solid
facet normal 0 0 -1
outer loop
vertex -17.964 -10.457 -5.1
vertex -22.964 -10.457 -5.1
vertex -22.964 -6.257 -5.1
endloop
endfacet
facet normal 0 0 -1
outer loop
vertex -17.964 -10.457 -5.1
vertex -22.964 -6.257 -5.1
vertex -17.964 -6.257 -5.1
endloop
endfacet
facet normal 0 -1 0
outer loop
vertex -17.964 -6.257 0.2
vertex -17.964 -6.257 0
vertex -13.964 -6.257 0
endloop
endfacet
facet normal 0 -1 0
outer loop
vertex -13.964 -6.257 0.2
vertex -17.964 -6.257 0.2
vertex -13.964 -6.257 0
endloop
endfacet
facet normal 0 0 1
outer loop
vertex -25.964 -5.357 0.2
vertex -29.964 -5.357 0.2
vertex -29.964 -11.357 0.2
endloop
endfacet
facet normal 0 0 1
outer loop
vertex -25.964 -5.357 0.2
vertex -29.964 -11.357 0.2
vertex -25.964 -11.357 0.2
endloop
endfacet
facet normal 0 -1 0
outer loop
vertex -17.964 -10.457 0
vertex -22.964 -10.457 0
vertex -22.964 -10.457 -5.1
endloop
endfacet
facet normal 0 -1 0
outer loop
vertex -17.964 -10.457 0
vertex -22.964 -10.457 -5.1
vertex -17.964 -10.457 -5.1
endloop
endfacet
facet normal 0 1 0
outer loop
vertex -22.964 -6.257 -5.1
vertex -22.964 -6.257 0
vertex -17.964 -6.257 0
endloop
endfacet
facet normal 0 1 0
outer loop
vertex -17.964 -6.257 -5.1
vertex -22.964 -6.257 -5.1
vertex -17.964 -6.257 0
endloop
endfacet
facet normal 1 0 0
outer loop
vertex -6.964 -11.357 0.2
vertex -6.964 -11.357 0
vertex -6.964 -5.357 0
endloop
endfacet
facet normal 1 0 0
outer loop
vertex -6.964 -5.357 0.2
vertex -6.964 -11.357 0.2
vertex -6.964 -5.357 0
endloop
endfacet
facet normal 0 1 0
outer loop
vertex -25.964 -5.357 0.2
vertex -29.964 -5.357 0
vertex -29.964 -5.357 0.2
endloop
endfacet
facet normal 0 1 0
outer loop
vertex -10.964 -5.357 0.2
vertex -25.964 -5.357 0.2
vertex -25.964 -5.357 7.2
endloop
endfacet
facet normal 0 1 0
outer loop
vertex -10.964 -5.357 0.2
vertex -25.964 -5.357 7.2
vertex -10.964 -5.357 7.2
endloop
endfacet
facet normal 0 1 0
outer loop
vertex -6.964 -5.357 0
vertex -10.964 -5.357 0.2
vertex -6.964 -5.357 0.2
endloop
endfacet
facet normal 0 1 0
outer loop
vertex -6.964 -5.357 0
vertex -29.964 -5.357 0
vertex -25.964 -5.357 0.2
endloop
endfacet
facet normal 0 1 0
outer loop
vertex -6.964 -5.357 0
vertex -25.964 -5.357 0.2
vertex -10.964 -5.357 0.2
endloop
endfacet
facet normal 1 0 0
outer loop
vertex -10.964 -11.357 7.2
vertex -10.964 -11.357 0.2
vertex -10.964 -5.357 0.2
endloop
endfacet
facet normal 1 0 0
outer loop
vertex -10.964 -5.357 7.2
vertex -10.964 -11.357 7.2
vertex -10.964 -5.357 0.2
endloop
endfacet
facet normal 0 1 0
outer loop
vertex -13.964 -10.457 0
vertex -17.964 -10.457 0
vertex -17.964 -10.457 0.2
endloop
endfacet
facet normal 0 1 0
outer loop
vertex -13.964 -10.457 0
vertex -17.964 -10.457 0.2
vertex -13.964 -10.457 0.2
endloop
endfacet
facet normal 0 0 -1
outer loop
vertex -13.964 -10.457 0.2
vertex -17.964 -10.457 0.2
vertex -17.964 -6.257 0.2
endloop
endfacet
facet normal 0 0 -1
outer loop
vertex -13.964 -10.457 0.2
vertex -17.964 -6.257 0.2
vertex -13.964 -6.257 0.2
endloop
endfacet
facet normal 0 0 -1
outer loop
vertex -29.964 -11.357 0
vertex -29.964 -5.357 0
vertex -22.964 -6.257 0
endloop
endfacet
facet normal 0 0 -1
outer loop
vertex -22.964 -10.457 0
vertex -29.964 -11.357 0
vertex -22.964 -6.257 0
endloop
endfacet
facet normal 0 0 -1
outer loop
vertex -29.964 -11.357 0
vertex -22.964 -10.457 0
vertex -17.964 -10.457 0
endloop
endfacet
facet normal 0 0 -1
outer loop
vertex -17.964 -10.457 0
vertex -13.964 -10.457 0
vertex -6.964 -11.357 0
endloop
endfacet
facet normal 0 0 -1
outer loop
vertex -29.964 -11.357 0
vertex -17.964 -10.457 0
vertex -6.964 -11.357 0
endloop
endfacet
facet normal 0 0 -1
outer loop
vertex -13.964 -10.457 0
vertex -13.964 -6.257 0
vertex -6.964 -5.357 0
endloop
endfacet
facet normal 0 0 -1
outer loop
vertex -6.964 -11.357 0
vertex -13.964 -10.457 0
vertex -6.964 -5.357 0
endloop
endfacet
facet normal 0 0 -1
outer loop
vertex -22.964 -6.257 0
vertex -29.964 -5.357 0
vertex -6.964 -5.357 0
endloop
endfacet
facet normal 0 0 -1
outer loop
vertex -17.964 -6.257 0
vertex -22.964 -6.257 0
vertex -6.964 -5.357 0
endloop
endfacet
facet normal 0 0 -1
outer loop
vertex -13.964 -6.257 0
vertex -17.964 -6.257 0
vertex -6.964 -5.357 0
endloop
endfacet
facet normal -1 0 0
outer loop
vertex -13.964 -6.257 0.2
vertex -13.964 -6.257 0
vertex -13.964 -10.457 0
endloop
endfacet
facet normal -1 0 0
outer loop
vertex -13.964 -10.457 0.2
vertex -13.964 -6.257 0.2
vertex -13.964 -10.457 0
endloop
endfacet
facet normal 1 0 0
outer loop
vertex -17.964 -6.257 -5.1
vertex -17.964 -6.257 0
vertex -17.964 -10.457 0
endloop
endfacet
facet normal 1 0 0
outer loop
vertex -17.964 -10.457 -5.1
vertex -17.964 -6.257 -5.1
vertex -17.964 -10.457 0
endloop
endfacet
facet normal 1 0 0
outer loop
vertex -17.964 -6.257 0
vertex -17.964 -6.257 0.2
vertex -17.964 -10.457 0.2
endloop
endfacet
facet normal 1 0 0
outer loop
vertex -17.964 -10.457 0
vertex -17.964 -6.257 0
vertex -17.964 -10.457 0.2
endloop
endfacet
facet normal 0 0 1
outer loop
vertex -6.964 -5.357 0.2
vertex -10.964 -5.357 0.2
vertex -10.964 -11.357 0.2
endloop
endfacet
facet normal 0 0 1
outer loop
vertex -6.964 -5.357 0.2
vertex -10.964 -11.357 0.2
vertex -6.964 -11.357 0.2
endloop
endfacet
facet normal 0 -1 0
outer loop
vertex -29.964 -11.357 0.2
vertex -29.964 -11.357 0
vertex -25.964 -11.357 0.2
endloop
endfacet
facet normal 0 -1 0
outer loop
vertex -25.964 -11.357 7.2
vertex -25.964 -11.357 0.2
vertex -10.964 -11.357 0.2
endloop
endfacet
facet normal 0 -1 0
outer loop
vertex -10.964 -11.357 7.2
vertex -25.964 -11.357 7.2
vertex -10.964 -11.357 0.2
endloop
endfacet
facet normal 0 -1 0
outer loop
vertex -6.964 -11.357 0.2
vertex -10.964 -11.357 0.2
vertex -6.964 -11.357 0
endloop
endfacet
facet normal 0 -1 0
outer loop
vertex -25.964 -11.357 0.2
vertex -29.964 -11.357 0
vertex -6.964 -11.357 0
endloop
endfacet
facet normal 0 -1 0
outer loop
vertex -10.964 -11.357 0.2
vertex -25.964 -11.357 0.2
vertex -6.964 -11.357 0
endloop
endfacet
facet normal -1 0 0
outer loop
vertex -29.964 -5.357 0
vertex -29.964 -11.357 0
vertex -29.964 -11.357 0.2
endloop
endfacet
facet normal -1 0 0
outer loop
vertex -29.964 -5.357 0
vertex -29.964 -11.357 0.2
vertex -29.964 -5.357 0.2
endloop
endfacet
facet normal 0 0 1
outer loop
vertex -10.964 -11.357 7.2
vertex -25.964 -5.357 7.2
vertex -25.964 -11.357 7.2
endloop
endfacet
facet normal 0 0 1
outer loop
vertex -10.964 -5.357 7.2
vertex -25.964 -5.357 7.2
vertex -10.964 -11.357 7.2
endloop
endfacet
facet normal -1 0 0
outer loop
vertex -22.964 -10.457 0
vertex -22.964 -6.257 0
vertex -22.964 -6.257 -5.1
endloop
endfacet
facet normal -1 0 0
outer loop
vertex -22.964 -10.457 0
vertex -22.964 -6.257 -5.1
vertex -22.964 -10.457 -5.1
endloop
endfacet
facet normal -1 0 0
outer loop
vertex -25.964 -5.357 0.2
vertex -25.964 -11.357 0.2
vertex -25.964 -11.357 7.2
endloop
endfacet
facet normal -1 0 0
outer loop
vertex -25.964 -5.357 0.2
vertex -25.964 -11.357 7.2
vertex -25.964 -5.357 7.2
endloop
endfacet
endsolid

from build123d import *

# Parameters (mm, degrees)
F0_W     = 23
F0_H     = 6
F1_DEPTH = 0.2
F2_W     = 15
F2_H     = 6
F3_DEPTH = 7
F4_W     = 9
F4_H     = 4.2
F5_DEPTH = 0.2
F6_W     = 5
F6_H     = 4.2
F7_DEPTH = 5.3


with BuildPart() as f1:
    # F0 (on Top) → F1 (new body)
    with BuildSketch(Plane.XY):
        with Locations((-18.463512, -8.357231)):
            Rectangle(F0_W, F0_H)
    extrude(amount=F1_DEPTH)

    # F2 (on face) → F3 (join)
    with BuildSketch(Plane.XY.offset(0.2)):
        with Locations((-18.463512, -8.357231)):
            Rectangle(F2_W, F2_H)
    extrude(amount=F3_DEPTH)

    # F4 (on face) → F5 (cut)
    with BuildSketch(Plane(origin=(0, 0, 0), x_dir=(1, 0, 0), z_dir=(0, 0, -1))):
        with Locations((-18.463512, 8.357231)):
            Rectangle(F4_W, F4_H)
    extrude(amount=-F5_DEPTH, mode=Mode.SUBTRACT)

    # F6 (on face) → F7 (join)
    with BuildSketch(Plane(origin=(0, 0, 0.2), x_dir=(1, 0, 0), z_dir=(0, 0, -1))):
        with Locations((-20.463512, 8.357231)):
            Rectangle(F6_W, F6_H)
    extrude(amount=F7_DEPTH)


solid = f1.part
